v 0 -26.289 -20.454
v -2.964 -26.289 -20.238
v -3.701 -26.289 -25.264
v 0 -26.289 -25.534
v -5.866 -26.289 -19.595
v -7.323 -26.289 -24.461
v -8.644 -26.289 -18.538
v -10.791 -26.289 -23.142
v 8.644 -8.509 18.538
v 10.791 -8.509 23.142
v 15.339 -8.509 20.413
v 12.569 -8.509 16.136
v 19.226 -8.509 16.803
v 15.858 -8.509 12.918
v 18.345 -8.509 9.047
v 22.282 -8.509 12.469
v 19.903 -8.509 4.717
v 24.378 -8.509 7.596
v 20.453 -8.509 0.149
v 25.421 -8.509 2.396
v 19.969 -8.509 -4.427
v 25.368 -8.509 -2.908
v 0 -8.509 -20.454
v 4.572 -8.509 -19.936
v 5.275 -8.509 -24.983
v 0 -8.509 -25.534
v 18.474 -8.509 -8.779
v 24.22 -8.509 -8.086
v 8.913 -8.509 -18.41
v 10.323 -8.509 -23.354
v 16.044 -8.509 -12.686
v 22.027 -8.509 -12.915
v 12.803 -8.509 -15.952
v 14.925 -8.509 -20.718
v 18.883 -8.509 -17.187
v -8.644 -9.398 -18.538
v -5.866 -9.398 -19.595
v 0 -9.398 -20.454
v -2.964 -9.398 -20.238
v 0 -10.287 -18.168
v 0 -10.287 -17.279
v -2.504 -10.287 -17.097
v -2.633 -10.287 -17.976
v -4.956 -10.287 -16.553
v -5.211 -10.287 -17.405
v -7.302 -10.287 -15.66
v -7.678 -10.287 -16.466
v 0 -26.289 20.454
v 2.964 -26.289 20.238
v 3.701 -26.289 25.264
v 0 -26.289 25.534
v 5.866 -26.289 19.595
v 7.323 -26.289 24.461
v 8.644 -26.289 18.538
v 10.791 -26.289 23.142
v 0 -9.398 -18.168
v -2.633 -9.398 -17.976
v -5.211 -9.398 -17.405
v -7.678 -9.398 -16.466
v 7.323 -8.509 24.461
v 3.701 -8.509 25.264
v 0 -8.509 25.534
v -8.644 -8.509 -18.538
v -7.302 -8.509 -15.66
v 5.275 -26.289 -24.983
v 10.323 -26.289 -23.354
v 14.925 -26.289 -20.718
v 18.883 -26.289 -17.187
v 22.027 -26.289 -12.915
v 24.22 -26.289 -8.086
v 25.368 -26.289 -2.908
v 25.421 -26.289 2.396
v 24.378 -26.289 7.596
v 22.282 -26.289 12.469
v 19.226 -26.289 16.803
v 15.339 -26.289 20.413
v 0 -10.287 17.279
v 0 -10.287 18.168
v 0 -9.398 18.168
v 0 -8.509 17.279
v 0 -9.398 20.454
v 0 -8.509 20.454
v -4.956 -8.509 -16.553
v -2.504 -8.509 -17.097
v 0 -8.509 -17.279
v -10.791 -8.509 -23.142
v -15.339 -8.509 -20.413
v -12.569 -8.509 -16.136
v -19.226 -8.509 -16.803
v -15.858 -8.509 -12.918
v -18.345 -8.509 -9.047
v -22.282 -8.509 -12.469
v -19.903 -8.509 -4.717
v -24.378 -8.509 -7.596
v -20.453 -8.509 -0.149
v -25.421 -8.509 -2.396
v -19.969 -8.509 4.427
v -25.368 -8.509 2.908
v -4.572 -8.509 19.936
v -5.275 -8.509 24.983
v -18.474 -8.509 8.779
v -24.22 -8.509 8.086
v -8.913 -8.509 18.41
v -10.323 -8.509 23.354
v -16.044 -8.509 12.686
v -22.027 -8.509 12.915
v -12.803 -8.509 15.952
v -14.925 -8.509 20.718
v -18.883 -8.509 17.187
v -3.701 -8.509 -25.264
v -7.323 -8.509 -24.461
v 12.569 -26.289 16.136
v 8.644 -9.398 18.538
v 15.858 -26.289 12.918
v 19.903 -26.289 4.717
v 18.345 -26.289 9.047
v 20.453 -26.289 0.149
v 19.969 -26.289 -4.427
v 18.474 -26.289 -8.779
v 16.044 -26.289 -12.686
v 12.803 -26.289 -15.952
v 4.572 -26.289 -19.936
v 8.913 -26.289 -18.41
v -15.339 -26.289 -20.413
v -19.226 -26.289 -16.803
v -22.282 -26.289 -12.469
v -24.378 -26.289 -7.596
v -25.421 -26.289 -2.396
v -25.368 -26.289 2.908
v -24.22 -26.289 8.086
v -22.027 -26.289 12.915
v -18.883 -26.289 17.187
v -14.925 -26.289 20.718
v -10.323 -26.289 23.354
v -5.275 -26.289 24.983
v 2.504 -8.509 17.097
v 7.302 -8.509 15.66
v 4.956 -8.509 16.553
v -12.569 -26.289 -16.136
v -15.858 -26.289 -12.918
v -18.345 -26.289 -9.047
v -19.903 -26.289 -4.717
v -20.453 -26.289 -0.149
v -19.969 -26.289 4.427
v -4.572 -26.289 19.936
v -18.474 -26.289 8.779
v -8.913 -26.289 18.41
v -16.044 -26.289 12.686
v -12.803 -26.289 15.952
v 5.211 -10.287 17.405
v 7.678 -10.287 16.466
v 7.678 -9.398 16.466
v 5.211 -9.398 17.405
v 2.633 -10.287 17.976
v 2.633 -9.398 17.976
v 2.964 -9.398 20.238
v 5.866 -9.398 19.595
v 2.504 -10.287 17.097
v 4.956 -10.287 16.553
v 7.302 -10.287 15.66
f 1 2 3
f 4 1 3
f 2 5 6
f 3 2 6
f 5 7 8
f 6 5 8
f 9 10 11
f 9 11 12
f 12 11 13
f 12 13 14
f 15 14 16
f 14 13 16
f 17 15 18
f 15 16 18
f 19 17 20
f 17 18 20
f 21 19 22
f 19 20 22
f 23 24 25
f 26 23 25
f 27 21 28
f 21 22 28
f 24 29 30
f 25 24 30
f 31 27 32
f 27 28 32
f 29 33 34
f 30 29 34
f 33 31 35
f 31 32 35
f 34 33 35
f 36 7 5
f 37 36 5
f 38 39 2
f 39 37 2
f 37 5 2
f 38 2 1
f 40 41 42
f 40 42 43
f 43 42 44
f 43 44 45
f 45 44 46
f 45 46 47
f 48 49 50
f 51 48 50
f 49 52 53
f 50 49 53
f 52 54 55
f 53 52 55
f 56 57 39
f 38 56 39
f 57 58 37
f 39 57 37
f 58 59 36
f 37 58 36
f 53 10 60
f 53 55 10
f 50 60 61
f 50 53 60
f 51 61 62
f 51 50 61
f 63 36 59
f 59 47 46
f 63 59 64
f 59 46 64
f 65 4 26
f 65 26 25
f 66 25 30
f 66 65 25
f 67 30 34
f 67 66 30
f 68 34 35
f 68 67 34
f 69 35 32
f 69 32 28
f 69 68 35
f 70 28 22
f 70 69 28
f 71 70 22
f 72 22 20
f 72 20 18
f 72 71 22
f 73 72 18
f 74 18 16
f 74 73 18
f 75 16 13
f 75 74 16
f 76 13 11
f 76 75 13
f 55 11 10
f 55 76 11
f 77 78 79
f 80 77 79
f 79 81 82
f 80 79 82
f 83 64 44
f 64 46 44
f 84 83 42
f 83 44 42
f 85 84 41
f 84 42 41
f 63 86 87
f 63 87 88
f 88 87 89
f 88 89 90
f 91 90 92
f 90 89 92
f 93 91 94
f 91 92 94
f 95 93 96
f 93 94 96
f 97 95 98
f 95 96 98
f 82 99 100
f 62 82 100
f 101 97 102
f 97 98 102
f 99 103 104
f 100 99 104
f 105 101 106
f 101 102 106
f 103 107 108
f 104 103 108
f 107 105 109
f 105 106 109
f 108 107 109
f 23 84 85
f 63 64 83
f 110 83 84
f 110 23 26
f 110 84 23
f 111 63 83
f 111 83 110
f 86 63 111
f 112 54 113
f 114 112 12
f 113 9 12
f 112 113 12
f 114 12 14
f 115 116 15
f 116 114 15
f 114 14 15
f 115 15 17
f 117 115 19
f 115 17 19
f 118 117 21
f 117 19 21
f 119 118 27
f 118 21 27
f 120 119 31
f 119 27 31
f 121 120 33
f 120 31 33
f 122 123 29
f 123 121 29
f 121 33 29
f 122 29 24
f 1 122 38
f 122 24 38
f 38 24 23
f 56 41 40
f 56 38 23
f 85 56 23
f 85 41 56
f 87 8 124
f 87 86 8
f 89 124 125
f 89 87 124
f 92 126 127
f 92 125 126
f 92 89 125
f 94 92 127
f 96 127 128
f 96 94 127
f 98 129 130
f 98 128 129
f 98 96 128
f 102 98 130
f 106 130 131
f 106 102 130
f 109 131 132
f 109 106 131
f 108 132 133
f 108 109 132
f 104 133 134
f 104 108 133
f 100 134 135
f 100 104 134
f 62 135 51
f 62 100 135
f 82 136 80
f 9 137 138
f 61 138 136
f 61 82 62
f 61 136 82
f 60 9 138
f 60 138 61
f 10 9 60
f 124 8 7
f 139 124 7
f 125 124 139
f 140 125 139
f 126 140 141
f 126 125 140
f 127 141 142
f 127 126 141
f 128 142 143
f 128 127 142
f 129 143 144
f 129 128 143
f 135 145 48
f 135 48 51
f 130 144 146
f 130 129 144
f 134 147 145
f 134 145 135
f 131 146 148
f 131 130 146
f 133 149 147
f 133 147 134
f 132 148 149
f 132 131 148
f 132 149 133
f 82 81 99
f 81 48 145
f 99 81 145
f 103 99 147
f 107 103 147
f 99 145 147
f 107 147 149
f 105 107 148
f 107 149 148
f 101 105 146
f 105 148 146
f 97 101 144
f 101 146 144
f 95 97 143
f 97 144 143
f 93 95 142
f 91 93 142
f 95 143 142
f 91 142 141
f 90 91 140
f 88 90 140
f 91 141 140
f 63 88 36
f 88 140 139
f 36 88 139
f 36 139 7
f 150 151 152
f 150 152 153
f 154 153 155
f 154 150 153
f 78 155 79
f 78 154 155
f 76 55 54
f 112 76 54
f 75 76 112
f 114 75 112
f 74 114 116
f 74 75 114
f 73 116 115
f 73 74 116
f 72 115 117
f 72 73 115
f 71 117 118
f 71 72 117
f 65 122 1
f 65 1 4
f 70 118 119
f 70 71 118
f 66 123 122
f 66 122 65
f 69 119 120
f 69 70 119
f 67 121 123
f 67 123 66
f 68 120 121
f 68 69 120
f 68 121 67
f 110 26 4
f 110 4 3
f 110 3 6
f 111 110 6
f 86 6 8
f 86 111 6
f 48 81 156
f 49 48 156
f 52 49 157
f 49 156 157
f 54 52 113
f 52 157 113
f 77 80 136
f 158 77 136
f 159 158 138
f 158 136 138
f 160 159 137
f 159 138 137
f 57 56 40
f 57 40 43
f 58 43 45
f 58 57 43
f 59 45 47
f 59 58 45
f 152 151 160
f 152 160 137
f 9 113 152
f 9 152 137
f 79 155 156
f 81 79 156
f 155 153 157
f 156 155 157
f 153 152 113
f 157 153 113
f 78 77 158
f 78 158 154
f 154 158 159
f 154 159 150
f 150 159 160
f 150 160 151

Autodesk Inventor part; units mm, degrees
ref_plane "YZ Plane" through (0, 0, 0) normal (1, 0, 0) x (0, 1, 0)
ref_plane "XZ Plane" through (0, 0, 0) normal (0, 1, 0) x (-1, 0, 0)
sketch "Sketch1" plane through (0, 0, 0) normal (1, 0, 0) x (0, 1, 0)
  line L0 (-8.509, -17.279) -> (-10.287, -17.279)
  line L1 (-10.287, -17.279) -> (-10.287, -18.168)
  line L2 (-10.287, -18.168) -> (-9.398, -18.168)
  line L3 (-9.398, -18.168) -> (-9.398, -20.454)
  line L4 (-9.398, -20.454) -> (-8.509, -20.454)
  line L5 (-8.509, 20.454) -> (-8.509, 17.279)
  line L6 (-8.509, 17.279) -> (-10.287, 17.279)
  line L7 (-10.287, 17.279) -> (-10.287, 18.168)
  line L8 (-10.287, 18.168) -> (-9.398, 18.168)
  line L9 (-9.398, 18.168) -> (-9.398, 20.454)
  line L10 (-8.509, 20.454) -> (-8.509, 25.534)
  line L11 (-8.509, 25.534) -> (-26.289, 25.534)
  line L12 (-26.289, 25.534) -> (-26.289, 20.454)
  line L13 (-26.289, 20.454) -> (-9.398, 20.454)
  line L14 (-8.509, -20.454) -> (-8.509, -25.534)
  line L15 (-8.509, -25.534) -> (-26.289, -25.534)
  line L16 (-26.289, -25.534) -> (-26.289, -20.454)
  line L17 (-26.289, -20.454) -> (-9.398, -20.454)
  line L18 (-26.289, 20.454) -> (-23.749, 20.454)
  line L19 (-8.509, -17.279) -> (-8.509, -20.454)
  line L20 (-8.509, -17.279) -> (-8.509, 17.279)
  line L21 (-8.509, 0) -> (-26.289, 0)
  dimension "d8" = 1.778
  dimension "d10" = 0.889
  dimension "d13" = 0.889
  dimension "d15" = 17.78
  dimension "d16" = 5.08
  dimension "d17" = 17.78
  dimension "d18" = 2.54
sketch "Sketch1 outline for Revolution1" plane through (0, 0, 0) normal (1, 0, 0) x (0, 1, 0)
  line L0 (-9.398, -18.168) -> (-9.398, -20.454)
  line L1 (-9.398, -20.454) -> (-26.289, -20.454)
  line L2 (-26.289, -20.454) -> (-26.289, -25.534)
  line L3 (-26.289, -25.534) -> (-8.509, -25.534)
  line L4 (-8.509, -25.534) -> (-8.509, -17.279)
  line L5 (-8.509, -17.279) -> (-10.287, -17.279)
  line L6 (-10.287, -17.279) -> (-10.287, -18.168)
  line L7 (-10.287, -18.168) -> (-9.398, -18.168)
  line L8 (-10.287, 17.279) -> (-8.509, 17.279)
  line L9 (-8.509, 17.279) -> (-8.509, 25.534)
  line L10 (-8.509, 25.534) -> (-26.289, 25.534)
  line L11 (-26.289, 25.534) -> (-26.289, 20.454)
  line L12 (-26.289, 20.454) -> (-9.398, 20.454)
  line L13 (-9.398, 20.454) -> (-9.398, 18.168)
  line L14 (-9.398, 18.168) -> (-10.287, 18.168)
  line L15 (-10.287, 18.168) -> (-10.287, 17.279)
revolve "Revolution1" add sketch "Sketch1 outline for Revolution1" angle 25 about axis through (0, -8.509, 0) along (0, 1, 0)
ref_plane "Work Plane1" through (0, -8.509, -25.534) normal (-1, 0, 0) x (0, -1, 0)
sketch "Sketch2" plane through (0, -8.509, -25.534) normal (-1, 0, 0) x (0, -1, 0)
  line L0 (0.889, 5.08) -> (17.78, 5.08)
  line L1 (17.78, 5.08) -> (17.78, 0)
  line L2 (0, 51.068) -> (17.78, 51.068)
  line L3 (17.78, 51.068) -> (0, 51.068)
  line L4 (-8.509, 25.534) -> (17.78, 25.534)
  line L5 (17.78, 51.068) -> (0, 51.068)
  line L6 (0, 51.068) -> (0, 45.988)
  line L7 (0, 45.988) -> (17.78, 45.988)
  line L8 (17.78, 45.988) -> (17.78, 51.068)
  line L9 (0.889, 5.08) -> (0, 5.08)
  line L10 (17.78, 5.08) -> (17.78, 0)
  line L11 (17.78, 2.392337) -> (17.78, 0)
  line L12 (17.78, 0) -> (0, 0)
  line L13 (0, 0) -> (0, 5.08)
  point P0 (0.889, 7.366)
sketch "Sketch2 outline for Revolution2" plane through (0, -8.509, -25.534) normal (-1, 0, 0) x (0, -1, 0)
  line L0 (17.78, 5.08) -> (0, 5.08)
  line L1 (0, 5.08) -> (0, 0)
  line L2 (0, 0) -> (17.78, 0)
  line L3 (17.78, 0) -> (17.78, 5.08)
  line L4 (17.78, 45.988) -> (17.78, 51.068)
  line L5 (0, 45.988) -> (17.78, 45.988)
  line L6 (0, 51.068) -> (0, 45.988)
  line L7 (17.78, 51.068) -> (0, 51.068)
revolve "Revolution2" add sketch "Sketch2 outline for Revolution2" angle 155 about axis through (0, 0, 0) along (0, -1, 0)
properties part number "RSL light mount (guard 1)"
